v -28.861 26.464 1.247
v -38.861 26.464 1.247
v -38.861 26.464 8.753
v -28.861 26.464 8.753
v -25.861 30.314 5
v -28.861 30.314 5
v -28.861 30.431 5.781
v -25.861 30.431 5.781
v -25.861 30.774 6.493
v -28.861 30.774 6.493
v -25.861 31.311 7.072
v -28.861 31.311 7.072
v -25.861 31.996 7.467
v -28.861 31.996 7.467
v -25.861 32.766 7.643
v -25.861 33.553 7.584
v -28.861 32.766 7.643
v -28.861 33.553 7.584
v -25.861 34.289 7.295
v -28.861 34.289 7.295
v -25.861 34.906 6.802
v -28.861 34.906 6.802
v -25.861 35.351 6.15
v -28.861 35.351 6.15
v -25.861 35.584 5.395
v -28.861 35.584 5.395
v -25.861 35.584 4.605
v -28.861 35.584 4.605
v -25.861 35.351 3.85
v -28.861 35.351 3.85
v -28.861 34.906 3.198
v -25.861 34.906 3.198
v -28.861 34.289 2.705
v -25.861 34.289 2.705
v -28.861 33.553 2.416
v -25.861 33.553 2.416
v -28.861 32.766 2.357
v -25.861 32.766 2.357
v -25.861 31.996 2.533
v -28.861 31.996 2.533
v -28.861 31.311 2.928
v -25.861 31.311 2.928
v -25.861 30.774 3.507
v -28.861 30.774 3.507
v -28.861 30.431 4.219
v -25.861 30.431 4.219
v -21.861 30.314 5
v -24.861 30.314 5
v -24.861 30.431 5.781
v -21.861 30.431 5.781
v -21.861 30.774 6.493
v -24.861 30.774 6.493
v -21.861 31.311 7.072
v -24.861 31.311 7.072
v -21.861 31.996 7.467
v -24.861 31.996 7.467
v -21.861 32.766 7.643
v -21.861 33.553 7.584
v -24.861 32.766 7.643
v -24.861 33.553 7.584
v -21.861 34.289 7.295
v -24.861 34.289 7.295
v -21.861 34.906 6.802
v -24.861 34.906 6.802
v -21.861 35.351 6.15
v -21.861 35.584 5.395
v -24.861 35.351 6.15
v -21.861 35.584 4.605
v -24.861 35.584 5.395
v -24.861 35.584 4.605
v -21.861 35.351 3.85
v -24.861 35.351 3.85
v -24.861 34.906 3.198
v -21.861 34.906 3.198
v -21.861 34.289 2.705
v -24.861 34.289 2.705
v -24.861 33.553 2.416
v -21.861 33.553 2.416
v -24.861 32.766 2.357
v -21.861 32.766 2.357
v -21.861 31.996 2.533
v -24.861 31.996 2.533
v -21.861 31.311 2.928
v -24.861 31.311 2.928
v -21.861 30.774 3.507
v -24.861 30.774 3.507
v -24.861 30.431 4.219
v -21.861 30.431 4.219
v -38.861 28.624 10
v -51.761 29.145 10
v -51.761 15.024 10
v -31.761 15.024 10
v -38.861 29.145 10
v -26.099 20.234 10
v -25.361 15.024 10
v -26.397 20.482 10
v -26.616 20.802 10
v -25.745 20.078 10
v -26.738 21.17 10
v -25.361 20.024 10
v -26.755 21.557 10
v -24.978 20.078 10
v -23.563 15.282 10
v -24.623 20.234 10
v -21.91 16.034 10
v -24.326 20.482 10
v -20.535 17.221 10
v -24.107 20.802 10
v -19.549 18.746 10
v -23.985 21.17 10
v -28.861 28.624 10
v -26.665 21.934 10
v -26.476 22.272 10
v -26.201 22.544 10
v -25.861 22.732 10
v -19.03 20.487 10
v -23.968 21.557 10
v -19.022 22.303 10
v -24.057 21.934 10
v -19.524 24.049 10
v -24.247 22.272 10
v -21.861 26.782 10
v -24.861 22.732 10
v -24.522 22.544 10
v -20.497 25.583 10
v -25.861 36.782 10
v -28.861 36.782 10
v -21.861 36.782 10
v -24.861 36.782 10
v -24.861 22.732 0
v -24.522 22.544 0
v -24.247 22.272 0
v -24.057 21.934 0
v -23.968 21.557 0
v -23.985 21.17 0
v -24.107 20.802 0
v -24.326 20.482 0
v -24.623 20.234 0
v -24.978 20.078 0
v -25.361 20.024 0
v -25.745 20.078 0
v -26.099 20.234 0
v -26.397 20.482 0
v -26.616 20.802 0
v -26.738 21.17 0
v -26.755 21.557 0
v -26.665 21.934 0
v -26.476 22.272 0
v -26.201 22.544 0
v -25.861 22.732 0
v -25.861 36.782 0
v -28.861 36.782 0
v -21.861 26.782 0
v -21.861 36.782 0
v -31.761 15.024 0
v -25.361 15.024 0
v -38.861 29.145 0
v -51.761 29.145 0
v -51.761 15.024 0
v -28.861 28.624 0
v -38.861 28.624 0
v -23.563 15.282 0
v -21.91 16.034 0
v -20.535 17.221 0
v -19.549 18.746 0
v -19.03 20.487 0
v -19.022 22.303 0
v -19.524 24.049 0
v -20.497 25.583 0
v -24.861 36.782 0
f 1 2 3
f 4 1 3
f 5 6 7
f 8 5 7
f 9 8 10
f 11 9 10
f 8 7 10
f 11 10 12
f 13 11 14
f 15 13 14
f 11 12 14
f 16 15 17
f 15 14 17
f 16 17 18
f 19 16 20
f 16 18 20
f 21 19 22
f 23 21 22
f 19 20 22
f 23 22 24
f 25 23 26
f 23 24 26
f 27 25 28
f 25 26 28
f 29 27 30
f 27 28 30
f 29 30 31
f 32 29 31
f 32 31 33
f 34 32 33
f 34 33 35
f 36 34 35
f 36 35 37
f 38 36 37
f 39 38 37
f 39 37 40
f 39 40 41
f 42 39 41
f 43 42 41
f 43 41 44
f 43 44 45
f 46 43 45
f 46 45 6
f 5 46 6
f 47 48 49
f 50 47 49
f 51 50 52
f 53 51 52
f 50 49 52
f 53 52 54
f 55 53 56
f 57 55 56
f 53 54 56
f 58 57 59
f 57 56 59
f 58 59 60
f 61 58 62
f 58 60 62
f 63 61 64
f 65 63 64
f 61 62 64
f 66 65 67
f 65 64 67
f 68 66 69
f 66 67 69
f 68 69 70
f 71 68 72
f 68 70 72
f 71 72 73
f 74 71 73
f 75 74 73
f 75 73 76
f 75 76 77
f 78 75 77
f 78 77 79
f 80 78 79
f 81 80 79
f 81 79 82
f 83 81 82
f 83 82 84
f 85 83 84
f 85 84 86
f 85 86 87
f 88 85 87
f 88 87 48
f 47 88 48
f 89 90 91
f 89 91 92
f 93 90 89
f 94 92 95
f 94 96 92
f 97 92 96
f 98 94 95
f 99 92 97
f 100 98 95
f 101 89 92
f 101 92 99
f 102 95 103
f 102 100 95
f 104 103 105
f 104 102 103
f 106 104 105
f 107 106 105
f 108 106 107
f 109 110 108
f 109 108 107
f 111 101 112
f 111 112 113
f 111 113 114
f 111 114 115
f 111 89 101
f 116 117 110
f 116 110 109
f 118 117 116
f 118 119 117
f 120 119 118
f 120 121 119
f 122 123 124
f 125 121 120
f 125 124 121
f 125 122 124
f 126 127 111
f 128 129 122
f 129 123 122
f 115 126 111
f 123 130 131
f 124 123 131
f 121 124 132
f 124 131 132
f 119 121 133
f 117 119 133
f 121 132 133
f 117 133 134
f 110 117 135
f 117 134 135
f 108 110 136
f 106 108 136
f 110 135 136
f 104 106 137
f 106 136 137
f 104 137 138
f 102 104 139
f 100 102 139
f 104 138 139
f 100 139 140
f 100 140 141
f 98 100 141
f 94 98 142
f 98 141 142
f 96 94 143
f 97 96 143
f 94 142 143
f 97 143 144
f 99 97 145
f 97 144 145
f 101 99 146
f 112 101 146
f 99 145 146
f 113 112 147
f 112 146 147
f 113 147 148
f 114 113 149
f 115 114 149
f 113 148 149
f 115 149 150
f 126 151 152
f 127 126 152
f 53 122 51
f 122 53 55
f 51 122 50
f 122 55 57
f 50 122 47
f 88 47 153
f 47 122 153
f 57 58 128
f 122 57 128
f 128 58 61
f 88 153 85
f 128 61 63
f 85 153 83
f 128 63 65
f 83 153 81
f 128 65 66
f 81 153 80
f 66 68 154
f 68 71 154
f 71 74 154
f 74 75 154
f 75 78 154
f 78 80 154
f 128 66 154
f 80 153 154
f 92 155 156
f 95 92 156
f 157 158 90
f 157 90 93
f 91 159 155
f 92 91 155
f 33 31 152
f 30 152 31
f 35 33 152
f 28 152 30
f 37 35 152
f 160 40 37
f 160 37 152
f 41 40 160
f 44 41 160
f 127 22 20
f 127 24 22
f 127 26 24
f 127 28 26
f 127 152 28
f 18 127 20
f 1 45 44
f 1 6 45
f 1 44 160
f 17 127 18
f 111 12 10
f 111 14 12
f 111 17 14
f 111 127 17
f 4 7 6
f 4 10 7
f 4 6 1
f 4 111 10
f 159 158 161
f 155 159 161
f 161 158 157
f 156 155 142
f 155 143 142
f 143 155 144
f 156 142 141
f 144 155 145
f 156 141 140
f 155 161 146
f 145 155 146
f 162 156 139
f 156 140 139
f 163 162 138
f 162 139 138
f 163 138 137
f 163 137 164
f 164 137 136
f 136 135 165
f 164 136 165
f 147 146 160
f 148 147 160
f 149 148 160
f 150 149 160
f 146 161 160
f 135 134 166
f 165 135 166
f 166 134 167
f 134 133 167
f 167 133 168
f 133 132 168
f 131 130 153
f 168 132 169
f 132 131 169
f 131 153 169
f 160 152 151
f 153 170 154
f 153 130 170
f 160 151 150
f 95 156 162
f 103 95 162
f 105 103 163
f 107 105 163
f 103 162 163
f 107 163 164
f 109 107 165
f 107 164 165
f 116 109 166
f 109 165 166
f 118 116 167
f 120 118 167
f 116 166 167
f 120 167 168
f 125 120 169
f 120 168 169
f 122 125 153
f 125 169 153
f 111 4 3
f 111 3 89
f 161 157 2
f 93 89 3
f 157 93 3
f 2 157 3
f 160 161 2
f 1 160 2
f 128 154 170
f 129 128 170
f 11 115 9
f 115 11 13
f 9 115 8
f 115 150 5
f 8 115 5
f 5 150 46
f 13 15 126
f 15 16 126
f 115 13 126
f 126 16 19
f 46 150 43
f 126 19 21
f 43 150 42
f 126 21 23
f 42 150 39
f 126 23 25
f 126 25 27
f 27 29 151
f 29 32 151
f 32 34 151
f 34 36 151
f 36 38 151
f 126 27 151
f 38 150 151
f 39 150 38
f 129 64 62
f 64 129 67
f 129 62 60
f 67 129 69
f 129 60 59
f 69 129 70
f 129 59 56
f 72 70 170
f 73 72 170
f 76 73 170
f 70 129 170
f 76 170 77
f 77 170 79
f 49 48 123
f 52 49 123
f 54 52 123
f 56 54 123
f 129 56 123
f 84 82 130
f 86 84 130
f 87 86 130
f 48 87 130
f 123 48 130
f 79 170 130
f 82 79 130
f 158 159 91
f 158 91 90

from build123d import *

# Parameters (mm, degrees)
F0_W     = 20
F0_H     = 14.121413
F1_DEPTH = 10
F2_R     = 2.65
F3_DEPTH = 9.901
F5_DEPTH = 10


with BuildPart() as f1:
    # F0 (on Top) → F1 (new body)
    with BuildSketch(Plane.XY):
        with Locations((-41.761377, 22.08462)):
            Rectangle(F0_W, F0_H)
        with BuildLine():
            ThreePointArc((-25.361377, 20.023914), (-26.738101, 21.169687), (-25.861377, 22.731583))
            Line((-25.861377, 22.731583), (-25.861377, 26.782085))
            Line((-25.861377, 26.782085), (-25.861377, 27.804352))
            Line((-25.861377, 27.804352), (-25.861377, 36.782085))
            Line((-25.861377, 36.782085), (-28.861377, 36.782085))
            Line((-28.861377, 36.782085), (-28.861377, 29.145327))
            Line((-28.861377, 29.145327), (-31.761377, 29.145327))
            Line((-31.761377, 29.145327), (-31.761377, 15.023914))
            Line((-31.761377, 15.023914), (-25.361377, 15.023914))
            Line((-25.361377, 15.023914), (-25.361377, 20.023914))
        make_face()
        with BuildLine():
            ThreePointArc((-24.861377, 22.731583), (-23.984653, 21.169687), (-25.361377, 20.023914))
            Line((-25.361377, 20.023914), (-25.361377, 15.023914))
            ThreePointArc((-25.361377, 15.023914), (-19.227361, 19.59803), (-21.861377, 26.782085))
            Line((-21.861377, 26.782085), (-21.861377, 36.782085))
            Line((-21.861377, 36.782085), (-24.861377, 36.782085))
            Line((-24.861377, 36.782085), (-24.861377, 27.804352))
            Line((-24.861377, 27.804352), (-24.861377, 26.782085))
            Line((-24.861377, 26.782085), (-24.861377, 22.731583))
        make_face()
    extrude(amount=F1_DEPTH)

    # F2 (on face) → F3 (cut, through all)
    with BuildSketch(Plane(origin=(-28.861377, 0, 0), x_dir=(0, -1, 0), z_dir=(-1, 0, 0))):
        with Locations((-32.963706, 5)):
            Circle(F2_R)
    extrude(amount=-F3_DEPTH, mode=Mode.SUBTRACT)

    # F4 (on face) → F5 (cut)
    with BuildSketch(Plane(origin=(-28.861377, 0, 0), x_dir=(0, -1, 0), z_dir=(-1, 0, 0))):
        Polygon((-39.463706, 8.752777), (-39.463706, 1.247223), (-32.963706, -2.505553), (-26.463706, 1.247223), (-26.463706, 8.752777), (-32.963706, 12.505553), align=None)
    extrude(amount=F5_DEPTH, mode=Mode.SUBTRACT)


solid = f1.part
